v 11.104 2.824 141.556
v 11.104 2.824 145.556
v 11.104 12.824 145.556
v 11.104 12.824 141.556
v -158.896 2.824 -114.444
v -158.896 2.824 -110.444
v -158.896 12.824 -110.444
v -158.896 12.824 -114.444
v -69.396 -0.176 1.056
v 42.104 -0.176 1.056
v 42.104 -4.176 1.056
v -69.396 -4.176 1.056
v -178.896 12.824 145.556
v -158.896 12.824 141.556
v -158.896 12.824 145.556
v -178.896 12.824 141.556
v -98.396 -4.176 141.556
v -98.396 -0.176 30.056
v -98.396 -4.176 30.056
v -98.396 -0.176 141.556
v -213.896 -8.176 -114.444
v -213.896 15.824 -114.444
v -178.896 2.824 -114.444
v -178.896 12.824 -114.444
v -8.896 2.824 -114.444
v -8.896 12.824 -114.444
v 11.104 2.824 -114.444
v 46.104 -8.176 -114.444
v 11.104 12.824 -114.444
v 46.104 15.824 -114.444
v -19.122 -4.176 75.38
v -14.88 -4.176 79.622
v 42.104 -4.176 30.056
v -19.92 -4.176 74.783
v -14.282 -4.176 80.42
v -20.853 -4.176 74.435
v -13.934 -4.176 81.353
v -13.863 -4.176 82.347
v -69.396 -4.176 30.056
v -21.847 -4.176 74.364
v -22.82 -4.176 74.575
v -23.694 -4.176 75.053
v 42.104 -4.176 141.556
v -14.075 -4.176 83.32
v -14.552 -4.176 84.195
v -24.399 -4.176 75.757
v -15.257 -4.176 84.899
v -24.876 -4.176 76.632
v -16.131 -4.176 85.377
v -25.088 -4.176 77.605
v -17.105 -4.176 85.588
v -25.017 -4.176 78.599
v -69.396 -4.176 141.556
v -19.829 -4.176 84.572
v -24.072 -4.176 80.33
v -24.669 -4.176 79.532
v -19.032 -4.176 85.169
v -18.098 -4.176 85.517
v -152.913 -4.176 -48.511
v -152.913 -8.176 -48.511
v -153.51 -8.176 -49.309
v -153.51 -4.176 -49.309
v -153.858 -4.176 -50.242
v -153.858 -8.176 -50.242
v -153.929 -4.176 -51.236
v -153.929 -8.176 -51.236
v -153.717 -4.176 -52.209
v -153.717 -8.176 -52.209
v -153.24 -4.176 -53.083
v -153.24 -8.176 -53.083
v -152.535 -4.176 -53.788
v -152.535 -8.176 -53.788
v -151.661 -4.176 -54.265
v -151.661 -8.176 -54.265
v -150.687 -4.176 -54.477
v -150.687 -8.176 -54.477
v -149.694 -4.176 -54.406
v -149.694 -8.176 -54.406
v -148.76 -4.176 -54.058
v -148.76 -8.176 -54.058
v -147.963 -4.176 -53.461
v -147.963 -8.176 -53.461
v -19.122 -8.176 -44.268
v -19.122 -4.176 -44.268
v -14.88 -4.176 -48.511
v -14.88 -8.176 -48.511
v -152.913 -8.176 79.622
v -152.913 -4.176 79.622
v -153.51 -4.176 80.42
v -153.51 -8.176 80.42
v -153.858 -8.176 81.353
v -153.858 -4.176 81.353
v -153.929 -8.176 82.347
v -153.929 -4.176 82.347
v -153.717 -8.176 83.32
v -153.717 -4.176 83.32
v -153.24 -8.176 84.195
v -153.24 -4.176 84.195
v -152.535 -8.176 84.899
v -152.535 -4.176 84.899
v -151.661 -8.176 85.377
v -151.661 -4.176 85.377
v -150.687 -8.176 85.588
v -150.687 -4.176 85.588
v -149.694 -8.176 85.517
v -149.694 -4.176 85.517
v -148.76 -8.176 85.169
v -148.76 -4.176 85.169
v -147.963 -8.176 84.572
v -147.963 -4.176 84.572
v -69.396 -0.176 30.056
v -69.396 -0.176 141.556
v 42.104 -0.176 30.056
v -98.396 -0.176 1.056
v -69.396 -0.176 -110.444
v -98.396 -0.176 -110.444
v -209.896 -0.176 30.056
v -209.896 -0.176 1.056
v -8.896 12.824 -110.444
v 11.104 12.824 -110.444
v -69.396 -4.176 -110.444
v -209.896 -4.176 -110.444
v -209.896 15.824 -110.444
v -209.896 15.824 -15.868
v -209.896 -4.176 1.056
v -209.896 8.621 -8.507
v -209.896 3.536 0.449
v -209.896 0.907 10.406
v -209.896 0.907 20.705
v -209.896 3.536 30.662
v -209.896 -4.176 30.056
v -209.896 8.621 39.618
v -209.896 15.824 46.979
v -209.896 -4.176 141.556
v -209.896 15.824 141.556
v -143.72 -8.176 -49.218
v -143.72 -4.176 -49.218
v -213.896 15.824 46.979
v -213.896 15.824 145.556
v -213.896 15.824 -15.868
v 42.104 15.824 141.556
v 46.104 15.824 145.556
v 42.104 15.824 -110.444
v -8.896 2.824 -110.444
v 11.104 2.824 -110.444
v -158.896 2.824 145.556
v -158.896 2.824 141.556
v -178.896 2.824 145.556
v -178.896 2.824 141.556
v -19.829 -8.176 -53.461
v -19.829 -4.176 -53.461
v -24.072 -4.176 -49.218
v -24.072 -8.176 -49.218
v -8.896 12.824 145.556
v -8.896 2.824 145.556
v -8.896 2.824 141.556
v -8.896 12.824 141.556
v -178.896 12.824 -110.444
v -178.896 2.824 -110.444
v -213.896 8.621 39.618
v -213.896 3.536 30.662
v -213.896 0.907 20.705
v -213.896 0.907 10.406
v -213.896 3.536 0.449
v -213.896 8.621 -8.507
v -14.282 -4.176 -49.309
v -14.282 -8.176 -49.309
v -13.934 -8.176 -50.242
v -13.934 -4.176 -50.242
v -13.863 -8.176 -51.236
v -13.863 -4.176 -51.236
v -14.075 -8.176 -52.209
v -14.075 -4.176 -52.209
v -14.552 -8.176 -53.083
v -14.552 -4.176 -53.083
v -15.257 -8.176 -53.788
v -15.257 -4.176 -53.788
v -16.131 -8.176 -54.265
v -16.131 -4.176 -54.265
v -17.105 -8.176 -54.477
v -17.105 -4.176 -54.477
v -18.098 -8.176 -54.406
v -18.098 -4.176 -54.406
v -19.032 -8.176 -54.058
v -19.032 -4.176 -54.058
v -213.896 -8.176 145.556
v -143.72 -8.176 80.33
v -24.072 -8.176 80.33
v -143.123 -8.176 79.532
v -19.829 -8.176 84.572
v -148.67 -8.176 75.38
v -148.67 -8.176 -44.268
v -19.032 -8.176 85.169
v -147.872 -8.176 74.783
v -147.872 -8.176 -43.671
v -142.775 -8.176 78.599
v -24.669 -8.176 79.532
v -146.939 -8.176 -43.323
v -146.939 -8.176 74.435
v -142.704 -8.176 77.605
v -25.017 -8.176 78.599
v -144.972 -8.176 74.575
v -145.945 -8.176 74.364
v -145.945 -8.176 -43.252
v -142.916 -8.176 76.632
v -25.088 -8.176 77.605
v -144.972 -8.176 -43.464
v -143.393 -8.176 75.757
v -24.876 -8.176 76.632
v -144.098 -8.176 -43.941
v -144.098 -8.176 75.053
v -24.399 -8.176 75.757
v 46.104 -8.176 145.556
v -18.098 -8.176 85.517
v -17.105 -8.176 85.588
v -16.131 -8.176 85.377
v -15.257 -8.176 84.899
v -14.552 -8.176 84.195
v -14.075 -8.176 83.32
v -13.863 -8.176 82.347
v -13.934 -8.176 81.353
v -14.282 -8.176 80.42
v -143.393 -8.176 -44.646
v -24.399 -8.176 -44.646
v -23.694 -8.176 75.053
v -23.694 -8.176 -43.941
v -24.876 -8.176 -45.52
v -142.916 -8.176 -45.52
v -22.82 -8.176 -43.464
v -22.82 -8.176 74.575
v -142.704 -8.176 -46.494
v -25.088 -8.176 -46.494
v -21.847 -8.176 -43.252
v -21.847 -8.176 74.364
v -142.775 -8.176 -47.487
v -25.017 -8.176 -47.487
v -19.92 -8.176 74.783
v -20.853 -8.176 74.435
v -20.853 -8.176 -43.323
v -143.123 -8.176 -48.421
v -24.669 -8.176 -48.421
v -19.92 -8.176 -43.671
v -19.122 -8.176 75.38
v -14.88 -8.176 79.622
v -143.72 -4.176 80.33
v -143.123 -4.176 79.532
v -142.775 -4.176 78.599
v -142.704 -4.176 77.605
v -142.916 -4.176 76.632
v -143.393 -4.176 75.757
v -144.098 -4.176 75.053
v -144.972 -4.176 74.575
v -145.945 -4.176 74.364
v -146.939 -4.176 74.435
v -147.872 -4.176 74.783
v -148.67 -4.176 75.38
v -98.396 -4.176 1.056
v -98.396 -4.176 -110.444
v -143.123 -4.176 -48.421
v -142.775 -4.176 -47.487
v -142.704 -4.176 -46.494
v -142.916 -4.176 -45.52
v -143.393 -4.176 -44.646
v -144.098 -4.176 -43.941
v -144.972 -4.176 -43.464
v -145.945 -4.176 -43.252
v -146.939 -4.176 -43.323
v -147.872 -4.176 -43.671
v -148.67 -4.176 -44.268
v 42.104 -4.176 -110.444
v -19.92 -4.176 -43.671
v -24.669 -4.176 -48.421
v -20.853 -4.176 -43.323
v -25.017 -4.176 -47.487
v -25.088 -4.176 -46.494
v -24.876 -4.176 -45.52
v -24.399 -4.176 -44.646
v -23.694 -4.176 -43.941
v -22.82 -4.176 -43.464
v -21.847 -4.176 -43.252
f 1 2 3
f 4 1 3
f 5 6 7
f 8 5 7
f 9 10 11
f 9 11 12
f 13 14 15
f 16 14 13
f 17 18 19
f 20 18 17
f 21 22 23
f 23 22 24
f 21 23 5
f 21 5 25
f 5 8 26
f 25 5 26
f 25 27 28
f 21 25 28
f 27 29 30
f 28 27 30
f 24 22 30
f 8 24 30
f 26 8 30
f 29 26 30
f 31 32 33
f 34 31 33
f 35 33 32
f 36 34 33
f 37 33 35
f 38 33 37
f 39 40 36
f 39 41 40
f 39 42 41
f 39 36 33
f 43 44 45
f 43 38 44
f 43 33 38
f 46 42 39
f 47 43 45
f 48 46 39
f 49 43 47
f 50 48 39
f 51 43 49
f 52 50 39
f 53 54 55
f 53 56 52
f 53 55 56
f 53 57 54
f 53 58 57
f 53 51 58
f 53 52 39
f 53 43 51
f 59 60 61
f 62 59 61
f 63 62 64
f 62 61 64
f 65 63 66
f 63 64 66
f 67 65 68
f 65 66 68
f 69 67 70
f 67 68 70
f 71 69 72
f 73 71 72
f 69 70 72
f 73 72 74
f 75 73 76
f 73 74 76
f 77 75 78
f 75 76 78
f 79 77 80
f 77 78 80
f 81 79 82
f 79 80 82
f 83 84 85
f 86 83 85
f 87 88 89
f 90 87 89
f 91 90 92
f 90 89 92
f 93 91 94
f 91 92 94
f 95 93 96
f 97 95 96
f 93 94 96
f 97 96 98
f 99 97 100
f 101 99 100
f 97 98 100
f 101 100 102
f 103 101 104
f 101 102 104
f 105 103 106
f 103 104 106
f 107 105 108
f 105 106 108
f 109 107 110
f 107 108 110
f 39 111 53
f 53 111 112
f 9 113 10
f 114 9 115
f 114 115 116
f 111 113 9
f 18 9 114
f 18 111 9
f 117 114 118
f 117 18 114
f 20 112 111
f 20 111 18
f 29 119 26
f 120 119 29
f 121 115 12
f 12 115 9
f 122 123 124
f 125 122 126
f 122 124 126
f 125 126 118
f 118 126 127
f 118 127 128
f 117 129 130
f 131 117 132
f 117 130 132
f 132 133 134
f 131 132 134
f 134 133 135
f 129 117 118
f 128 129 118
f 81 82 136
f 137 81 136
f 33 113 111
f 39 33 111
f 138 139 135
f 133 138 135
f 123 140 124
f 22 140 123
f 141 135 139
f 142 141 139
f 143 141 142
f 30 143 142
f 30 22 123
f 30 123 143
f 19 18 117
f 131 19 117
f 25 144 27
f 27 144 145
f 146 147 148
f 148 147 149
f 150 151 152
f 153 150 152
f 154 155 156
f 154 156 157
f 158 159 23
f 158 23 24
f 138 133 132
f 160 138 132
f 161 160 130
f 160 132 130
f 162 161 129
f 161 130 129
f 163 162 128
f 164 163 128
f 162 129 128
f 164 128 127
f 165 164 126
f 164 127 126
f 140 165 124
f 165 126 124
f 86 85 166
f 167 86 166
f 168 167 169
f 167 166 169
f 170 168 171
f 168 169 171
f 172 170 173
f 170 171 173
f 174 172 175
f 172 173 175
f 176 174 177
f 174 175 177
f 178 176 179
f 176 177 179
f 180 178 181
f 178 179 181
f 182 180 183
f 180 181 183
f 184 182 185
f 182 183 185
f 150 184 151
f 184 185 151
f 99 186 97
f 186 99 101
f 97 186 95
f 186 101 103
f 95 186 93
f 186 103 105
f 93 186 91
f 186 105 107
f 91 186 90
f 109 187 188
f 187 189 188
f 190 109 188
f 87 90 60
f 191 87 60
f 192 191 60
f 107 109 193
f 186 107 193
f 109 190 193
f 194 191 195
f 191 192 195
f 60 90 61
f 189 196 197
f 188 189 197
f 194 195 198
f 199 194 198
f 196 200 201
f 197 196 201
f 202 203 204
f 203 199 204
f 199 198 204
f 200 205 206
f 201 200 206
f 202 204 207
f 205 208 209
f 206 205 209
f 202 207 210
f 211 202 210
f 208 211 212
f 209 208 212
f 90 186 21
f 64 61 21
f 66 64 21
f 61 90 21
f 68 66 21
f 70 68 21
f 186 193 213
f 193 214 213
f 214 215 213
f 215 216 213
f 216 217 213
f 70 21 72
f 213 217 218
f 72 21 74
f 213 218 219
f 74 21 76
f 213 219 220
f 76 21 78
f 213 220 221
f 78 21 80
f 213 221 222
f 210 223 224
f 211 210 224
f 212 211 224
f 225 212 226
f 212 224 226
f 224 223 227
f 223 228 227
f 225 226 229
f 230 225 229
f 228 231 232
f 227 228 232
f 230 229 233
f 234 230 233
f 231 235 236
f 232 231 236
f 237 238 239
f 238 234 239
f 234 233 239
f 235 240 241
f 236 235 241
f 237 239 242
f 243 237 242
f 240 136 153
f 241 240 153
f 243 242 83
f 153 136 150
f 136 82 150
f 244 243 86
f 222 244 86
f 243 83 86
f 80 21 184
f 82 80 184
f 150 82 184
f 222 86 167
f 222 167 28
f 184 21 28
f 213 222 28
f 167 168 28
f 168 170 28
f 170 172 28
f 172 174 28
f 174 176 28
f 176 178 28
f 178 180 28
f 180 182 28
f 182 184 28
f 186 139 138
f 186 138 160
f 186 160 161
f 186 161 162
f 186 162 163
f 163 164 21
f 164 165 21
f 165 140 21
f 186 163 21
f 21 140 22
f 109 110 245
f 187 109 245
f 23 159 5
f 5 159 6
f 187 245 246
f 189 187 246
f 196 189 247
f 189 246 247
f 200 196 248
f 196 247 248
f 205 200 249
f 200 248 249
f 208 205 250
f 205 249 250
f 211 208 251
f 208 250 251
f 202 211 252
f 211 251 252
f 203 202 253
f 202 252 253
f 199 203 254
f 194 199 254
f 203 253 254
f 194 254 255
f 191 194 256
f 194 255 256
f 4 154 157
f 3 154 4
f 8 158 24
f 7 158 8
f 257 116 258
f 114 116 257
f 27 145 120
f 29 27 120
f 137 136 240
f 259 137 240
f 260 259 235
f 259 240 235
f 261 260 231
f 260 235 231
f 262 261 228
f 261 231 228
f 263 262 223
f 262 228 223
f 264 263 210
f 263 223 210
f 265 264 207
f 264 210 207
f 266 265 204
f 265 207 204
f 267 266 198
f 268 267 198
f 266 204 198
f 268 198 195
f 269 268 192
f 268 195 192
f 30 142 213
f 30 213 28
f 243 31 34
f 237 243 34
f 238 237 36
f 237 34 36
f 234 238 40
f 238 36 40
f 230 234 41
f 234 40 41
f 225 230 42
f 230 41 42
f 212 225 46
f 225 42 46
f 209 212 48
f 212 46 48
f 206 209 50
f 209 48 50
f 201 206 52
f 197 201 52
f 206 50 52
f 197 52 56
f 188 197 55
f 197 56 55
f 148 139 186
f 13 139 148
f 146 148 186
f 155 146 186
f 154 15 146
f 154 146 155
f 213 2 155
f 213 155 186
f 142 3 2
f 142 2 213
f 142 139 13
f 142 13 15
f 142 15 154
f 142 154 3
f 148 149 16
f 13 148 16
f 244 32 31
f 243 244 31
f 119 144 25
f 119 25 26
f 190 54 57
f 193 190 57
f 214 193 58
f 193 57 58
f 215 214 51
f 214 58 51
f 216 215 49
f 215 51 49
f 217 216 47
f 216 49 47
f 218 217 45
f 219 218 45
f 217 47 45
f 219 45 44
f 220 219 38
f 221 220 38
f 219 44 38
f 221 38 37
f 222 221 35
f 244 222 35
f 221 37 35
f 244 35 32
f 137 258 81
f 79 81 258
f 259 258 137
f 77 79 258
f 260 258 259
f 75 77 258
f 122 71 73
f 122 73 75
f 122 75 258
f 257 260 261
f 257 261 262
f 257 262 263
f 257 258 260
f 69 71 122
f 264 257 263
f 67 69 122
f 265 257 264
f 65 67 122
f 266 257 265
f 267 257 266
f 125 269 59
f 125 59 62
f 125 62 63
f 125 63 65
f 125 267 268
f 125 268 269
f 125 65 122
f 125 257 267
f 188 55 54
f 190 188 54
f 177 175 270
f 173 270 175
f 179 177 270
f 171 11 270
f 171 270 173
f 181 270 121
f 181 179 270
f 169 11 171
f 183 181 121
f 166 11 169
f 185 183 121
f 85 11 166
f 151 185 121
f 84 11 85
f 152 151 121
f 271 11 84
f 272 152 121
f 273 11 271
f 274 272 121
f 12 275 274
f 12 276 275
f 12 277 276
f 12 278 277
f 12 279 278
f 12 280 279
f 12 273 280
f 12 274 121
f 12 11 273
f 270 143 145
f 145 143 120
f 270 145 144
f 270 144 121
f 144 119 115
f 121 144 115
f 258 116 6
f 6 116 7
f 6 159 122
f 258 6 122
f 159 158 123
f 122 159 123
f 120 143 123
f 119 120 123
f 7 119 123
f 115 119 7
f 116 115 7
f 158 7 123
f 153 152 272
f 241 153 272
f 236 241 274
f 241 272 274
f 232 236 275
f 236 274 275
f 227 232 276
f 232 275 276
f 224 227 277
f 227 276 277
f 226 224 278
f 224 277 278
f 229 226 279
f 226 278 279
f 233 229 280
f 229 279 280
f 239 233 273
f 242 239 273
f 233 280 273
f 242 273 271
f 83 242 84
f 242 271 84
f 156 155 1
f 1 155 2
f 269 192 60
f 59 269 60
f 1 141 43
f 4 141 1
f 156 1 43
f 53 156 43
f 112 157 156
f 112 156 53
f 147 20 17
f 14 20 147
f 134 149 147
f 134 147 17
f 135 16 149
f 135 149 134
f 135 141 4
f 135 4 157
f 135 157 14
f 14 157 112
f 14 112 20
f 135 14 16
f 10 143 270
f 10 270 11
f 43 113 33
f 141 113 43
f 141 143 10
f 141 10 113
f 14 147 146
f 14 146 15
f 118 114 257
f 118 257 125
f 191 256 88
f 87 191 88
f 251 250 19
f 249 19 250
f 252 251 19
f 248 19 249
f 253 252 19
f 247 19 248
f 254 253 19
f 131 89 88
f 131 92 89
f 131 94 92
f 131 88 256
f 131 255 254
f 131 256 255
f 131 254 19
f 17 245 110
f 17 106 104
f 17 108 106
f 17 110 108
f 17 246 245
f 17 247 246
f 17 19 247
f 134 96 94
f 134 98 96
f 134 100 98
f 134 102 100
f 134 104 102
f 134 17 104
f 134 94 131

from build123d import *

# Parameters (mm, degrees)
SKETCH1_W           = 260
SKETCH1_H           = 260
BOSS_EXTRUDE1_DEPTH = 24
SKETCH2_W           = 252
SKETCH2_H           = 252
CUT_EXTRUDE1_DEPTH  = 16
SKETCH3_W           = 111.5
SKETCH3_H           = 111.5
CUT_EXTRUDE2_DEPTH  = 4
SKETCH4_W           = 111.5
SKETCH4_H           = 111.5
CUT_EXTRUDE3_DEPTH  = 4
SKETCH5_W           = 111.5
SKETCH5_H           = 111.5
CUT_EXTRUDE4_DEPTH  = 4
SKETCH6_W           = 111.5
SKETCH6_H           = 111.5
CUT_EXTRUDE5_DEPTH  = 4
CUT_EXTRUDE6_DEPTH  = 295.911587107
SKETCH8_W           = 20
SKETCH8_H           = 10
CUT_EXTRUDE7_DEPTH  = 334.972898877
CUT_EXTRUDE8_DEPTH  = 260.495566311
CUT_EXTRUDE9_DEPTH  = 260.495566311
CUT_EXTRUDE10_REACH = 339.049
SKETCH11_W          = 20
SKETCH11_H          = 10
SKETCH12_W          = 20
SKETCH12_H          = 10
CUT_EXTRUDE11_DEPTH = 334.972898877
CUT_EXTRUDE12_DEPTH = 260.495566311
SKETCH14_W          = 20
SKETCH14_H          = 10
CUT_EXTRUDE13_DEPTH = 334.972898877
CUT_EXTRUDE14_DEPTH = 260.834464487


with BuildPart() as part:
    # Sketch1 → Boss-Extrude1 (new body)
    with BuildSketch(Plane(origin=(0, 15.823913221, 0), x_dir=(1, 0, 0), z_dir=(0, 1, 0))):
        with Locations((-83.896005, -15.555652519)):
            Rectangle(SKETCH1_W, SKETCH1_H)
    extrude(amount=-BOSS_EXTRUDE1_DEPTH)

    # Sketch2 → Cut-Extrude1 (cut)
    with BuildSketch(Plane(origin=(0, 15.823913221, 0), x_dir=(-1, 0, 0), z_dir=(0, 1, 0))):
        with Locations((83.896005, 15.555652519)):
            Rectangle(SKETCH2_W, SKETCH2_H)
    extrude(amount=-CUT_EXTRUDE1_DEPTH, mode=Mode.SUBTRACT)

    # Sketch3 → Cut-Extrude2 (cut)
    with BuildSketch(Plane(origin=(0, -0.176086779, 0), x_dir=(-1, 0, 0), z_dir=(0, 1, 0))):
        with Locations((13.646005, 85.805652519)):
            Rectangle(SKETCH3_W, SKETCH3_H)
    extrude(amount=-CUT_EXTRUDE2_DEPTH, mode=Mode.SUBTRACT)

    # Sketch4 → Cut-Extrude3 (cut)
    with BuildSketch(Plane(origin=(0, -0.176086779, 0), x_dir=(-1, 0, 0), z_dir=(0, 1, 0))):
        with Locations((154.146005, 85.805652519)):
            Rectangle(SKETCH4_W, SKETCH4_H)
    extrude(amount=-CUT_EXTRUDE3_DEPTH, mode=Mode.SUBTRACT)

    # Sketch5 → Cut-Extrude4 (cut)
    with BuildSketch(Plane(origin=(0, -0.176086779, 0), x_dir=(-1, 0, 0), z_dir=(0, 1, 0))):
        with Locations((154.146005, -54.694347481)):
            Rectangle(SKETCH5_W, SKETCH5_H)
    extrude(amount=-CUT_EXTRUDE4_DEPTH, mode=Mode.SUBTRACT)

    # Sketch6 → Cut-Extrude5 (cut)
    with BuildSketch(Plane(origin=(0, -0.176086779, 0), x_dir=(-1, 0, 0), z_dir=(0, 1, 0))):
        with Locations((13.646005, -54.694347481)):
            Rectangle(SKETCH6_W, SKETCH6_H)
    extrude(amount=-CUT_EXTRUDE5_DEPTH, mode=Mode.SUBTRACT)

    # Sketch7 → Cut-Extrude6 (cut, through all)
    with BuildSketch(Plane(origin=(-209.896005, 0, 0), x_dir=(0, 0, -1), z_dir=(1, 0, 0))):
        with BuildLine():
            Line((15.867865744, 15.823913221), (-46.979170782, 15.823913221))
            ThreePointArc((-46.979170782, 15.823913221), (-15.555652519, 0.573913221), (15.867865744, 15.823913221))
        make_face()
    extrude(amount=-CUT_EXTRUDE6_DEPTH, mode=Mode.SUBTRACT)

    # Sketch8 → Cut-Extrude7 (cut, through all)
    with BuildSketch(Plane(origin=(0, 0, 141.555652519), x_dir=(-1, 0, 0), z_dir=(0, 0, -1))):
        with Locations((168.896005, 7.823913221)):
            Rectangle(SKETCH8_W, SKETCH8_H)
    extrude(amount=-CUT_EXTRUDE7_DEPTH, mode=Mode.SUBTRACT)

    # Sketch9 → Cut-Extrude8 (cut, through all)
    with BuildSketch(Plane(origin=(0, -4.176086779, 0), x_dir=(-1, 0, 0), z_dir=(0, 1, 0))):
        with BuildLine():
            Line((24.071888861, 80.329516126), (19.829248174, 84.572156814))
            ThreePointArc((19.829248174, 84.572156814), (14.879500705, 84.572156814), (14.879500705, 79.622409345))
            Line((14.879500705, 79.622409345), (19.122141392, 75.379768658))
            ThreePointArc((19.122141392, 75.379768658), (24.071888861, 75.379768658), (24.071888861, 80.329516126))
        make_face()
    extrude(amount=-CUT_EXTRUDE8_DEPTH, mode=Mode.SUBTRACT)

    # Sketch10 → Cut-Extrude9 (cut, through all)
    with BuildSketch(Plane(origin=(0, -4.176086779, 0), x_dir=(-1, 0, 0), z_dir=(0, 1, 0))):
        with BuildLine():
            Line((147.962761826, 84.572156814), (143.720121139, 80.329516126))
            ThreePointArc((143.720121139, 80.329516126), (143.720121139, 75.379768658), (148.669868607, 75.379768658))
            Line((148.669868607, 75.379768658), (152.912509294, 79.622409345))
            ThreePointArc((152.912509294, 79.622409345), (152.912509294, 84.572156814), (147.962761826, 84.572156814))
        make_face()
    extrude(amount=-CUT_EXTRUDE9_DEPTH, mode=Mode.SUBTRACT)

    # Sketch11 → Cut-Extrude10 (cut, up to next)
    with BuildSketch(Plane.XY.offset(145.555652519), mode=Mode.PRIVATE) as cut_extrude10_sk1:
        with Locations((1.103995, 7.823913221)):
            Rectangle(SKETCH11_W, SKETCH11_H)
    cut_extrude10_tool1 = extrude(cut_extrude10_sk1.sketch, amount=-CUT_EXTRUDE10_REACH, mode=Mode.PRIVATE) & part.part
    add(cut_extrude10_tool1.solids().sort_by_distance((1.103995, 7.823913, 145.555653))[0], mode=Mode.SUBTRACT)

    # Sketch12 → Cut-Extrude11 (cut, through all)
    with BuildSketch(Plane.XY.offset(-110.444347481)):
        with Locations((-168.896005, 7.823913221)):
            Rectangle(SKETCH12_W, SKETCH12_H)
    extrude(amount=-CUT_EXTRUDE11_DEPTH, mode=Mode.SUBTRACT)

    # Sketch13 → Cut-Extrude12 (cut, through all)
    with BuildSketch(Plane(origin=(0, -4.176086779, 0), x_dir=(-1, 0, 0), z_dir=(0, 1, 0))):
        with BuildLine():
            Line((19.829248174, -53.460851775), (24.071888861, -49.218211088))
            ThreePointArc((24.071888861, -49.218211088), (24.071888861, -44.26846362), (19.122141392, -44.26846362))
            Line((19.122141392, -44.26846362), (14.879500705, -48.511104307))
            ThreePointArc((14.879500705, -48.511104307), (14.879500705, -53.460851775), (19.829248174, -53.460851775))
        make_face()
    extrude(amount=-CUT_EXTRUDE12_DEPTH, mode=Mode.SUBTRACT)

    # Sketch14 → Cut-Extrude13 (cut, through all)
    with BuildSketch(Plane.XY.offset(-110.444347481)):
        with Locations((1.103995, 7.823913221)):
            Rectangle(SKETCH14_W, SKETCH14_H)
    extrude(amount=-CUT_EXTRUDE13_DEPTH, mode=Mode.SUBTRACT)

    # Sketch15 → Cut-Extrude14 (cut, through all)
    with BuildSketch(Plane.XZ.offset(8.176086779)):
        with BuildLine():
            Line((-148.669868607, -44.26846362), (-152.912509294, -48.511104307))
            ThreePointArc((-152.912509294, -48.511104307), (-152.912509294, -53.460851775), (-147.962761826, -53.460851775))
            Line((-147.962761826, -53.460851775), (-143.720121139, -49.218211088))
            ThreePointArc((-143.720121139, -49.218211088), (-143.720121139, -44.26846362), (-148.669868607, -44.26846362))
        make_face()
    extrude(amount=-CUT_EXTRUDE14_DEPTH, mode=Mode.SUBTRACT)


solid = part.part
